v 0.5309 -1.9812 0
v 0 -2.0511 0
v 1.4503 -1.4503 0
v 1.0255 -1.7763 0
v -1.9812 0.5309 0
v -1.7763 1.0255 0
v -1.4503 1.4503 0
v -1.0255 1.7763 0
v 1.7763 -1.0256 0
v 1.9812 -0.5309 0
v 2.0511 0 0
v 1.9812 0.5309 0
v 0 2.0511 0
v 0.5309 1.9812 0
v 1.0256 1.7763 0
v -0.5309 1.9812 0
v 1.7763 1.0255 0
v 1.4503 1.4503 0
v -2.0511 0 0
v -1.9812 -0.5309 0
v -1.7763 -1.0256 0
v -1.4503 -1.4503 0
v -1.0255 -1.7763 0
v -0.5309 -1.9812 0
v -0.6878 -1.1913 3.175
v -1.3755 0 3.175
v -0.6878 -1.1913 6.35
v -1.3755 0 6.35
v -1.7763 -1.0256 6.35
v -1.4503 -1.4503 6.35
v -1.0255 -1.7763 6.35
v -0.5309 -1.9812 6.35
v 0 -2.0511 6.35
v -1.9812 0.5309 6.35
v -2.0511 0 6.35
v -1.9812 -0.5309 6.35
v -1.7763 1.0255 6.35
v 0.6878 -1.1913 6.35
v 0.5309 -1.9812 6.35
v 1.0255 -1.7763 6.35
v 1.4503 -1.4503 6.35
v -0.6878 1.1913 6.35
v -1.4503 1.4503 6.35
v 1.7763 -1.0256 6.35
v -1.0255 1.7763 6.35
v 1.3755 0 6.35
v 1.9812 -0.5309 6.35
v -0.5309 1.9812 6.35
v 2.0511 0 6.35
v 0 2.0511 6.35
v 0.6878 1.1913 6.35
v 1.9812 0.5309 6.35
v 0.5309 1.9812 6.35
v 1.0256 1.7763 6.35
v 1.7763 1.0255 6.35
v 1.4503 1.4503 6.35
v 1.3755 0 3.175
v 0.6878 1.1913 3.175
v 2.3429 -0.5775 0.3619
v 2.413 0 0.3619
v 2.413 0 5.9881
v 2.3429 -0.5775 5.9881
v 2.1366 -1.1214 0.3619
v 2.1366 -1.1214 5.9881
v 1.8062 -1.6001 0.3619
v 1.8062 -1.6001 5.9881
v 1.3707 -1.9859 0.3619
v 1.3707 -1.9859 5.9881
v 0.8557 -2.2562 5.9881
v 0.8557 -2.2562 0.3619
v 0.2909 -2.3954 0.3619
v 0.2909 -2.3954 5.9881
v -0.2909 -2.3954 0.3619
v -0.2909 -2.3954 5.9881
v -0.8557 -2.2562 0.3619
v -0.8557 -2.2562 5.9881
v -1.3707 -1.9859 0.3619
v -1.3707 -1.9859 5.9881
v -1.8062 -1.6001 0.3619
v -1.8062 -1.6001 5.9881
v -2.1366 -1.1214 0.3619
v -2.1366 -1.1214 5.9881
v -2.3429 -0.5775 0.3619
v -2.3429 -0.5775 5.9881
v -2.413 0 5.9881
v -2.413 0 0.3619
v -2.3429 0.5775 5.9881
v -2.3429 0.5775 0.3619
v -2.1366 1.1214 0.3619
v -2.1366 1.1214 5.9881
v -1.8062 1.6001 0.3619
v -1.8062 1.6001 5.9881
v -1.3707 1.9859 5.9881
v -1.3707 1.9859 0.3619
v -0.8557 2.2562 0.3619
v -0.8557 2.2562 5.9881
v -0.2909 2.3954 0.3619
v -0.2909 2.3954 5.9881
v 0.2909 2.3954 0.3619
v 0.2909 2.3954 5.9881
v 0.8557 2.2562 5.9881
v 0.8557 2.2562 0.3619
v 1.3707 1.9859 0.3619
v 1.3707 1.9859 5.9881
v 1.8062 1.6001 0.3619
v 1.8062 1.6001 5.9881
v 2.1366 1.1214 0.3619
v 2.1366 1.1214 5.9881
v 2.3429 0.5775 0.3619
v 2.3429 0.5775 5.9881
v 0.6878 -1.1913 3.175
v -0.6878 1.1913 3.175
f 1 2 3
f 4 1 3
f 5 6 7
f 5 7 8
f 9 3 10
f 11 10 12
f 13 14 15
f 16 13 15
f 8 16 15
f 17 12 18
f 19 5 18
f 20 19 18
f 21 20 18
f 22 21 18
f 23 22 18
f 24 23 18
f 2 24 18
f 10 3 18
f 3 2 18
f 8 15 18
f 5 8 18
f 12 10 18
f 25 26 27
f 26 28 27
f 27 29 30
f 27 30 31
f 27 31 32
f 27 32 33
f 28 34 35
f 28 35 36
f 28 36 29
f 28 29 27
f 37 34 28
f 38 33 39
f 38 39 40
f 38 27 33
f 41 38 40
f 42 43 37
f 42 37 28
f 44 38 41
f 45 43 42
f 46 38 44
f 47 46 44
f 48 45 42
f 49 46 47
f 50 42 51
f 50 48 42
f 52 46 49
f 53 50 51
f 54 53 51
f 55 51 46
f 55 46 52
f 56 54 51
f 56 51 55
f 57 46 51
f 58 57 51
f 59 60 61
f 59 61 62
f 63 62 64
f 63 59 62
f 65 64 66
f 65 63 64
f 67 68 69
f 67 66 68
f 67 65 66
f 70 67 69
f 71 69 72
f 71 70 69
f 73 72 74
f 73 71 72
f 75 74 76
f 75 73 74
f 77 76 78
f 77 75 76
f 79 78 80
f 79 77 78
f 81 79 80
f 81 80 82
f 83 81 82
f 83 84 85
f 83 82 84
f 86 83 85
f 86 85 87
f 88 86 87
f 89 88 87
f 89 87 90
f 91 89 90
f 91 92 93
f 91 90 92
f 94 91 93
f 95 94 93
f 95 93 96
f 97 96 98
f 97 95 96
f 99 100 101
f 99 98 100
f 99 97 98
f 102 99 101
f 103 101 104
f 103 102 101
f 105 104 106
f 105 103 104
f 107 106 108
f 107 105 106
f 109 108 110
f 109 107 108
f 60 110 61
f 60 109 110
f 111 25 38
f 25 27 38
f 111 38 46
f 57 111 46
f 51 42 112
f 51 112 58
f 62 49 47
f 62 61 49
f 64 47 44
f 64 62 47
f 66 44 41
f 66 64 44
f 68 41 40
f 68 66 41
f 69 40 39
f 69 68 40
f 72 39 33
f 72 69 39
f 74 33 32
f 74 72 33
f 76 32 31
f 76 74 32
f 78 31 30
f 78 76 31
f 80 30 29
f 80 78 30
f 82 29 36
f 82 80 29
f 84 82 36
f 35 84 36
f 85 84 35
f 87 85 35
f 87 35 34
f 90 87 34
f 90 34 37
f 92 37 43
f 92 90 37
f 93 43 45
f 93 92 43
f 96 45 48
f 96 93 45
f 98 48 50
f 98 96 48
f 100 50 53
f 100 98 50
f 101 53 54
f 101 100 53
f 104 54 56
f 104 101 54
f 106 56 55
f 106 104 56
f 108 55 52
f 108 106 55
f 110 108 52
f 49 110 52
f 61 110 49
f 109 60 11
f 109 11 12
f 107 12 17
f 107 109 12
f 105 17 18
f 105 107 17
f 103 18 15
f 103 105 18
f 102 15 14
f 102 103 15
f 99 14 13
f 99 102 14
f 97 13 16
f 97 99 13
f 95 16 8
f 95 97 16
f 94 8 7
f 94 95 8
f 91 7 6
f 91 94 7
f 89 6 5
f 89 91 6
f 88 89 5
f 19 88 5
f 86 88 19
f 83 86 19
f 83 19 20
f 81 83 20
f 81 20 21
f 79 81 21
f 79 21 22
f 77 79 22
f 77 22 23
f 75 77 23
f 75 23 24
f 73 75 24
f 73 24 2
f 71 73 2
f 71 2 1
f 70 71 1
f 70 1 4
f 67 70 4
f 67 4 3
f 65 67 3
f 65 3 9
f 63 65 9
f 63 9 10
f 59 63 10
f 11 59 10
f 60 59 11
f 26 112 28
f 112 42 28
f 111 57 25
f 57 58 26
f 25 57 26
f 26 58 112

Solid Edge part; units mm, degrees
sketch "Sketch1" plane through (0, 0, 0) normal (0, 0, 1) x (1, 0, 0)
  circle A0 centre (0, 0) radius 2.413
  dimension "D1" = 4.826
extrude "Protrusion1" add sketch "Sketch1" along normal blind 6.35
chamfer "Chamfer1" distance 0.3619 angle 45 2 edges at (-2.413, 0, 0) (-2.413, 0, 6.35)
sketch "Sketch2" plane through (0, 0, 6.35) normal (0, 0, 1) x (1, 0, 0)
  line L0 (-0.6878, 1.1913) -> (0.6878, 1.1913)
  line L1 (1.3755, 0) -> (0.6878, 1.1913)
  line L2 (0.6878, -1.1913) -> (1.3755, 0)
  line L3 (-0.6878, -1.1913) -> (0.6878, -1.1913)
  line L4 (-1.3755, 0) -> (-0.6878, -1.1913)
  line L5 (-0.6878, 1.1913) -> (-1.3755, 0)
  dimension "D1" = 2.3825
extrude "Cutout1" cut sketch "Sketch2" against normal blind 3.175
properties part number "24101679"
